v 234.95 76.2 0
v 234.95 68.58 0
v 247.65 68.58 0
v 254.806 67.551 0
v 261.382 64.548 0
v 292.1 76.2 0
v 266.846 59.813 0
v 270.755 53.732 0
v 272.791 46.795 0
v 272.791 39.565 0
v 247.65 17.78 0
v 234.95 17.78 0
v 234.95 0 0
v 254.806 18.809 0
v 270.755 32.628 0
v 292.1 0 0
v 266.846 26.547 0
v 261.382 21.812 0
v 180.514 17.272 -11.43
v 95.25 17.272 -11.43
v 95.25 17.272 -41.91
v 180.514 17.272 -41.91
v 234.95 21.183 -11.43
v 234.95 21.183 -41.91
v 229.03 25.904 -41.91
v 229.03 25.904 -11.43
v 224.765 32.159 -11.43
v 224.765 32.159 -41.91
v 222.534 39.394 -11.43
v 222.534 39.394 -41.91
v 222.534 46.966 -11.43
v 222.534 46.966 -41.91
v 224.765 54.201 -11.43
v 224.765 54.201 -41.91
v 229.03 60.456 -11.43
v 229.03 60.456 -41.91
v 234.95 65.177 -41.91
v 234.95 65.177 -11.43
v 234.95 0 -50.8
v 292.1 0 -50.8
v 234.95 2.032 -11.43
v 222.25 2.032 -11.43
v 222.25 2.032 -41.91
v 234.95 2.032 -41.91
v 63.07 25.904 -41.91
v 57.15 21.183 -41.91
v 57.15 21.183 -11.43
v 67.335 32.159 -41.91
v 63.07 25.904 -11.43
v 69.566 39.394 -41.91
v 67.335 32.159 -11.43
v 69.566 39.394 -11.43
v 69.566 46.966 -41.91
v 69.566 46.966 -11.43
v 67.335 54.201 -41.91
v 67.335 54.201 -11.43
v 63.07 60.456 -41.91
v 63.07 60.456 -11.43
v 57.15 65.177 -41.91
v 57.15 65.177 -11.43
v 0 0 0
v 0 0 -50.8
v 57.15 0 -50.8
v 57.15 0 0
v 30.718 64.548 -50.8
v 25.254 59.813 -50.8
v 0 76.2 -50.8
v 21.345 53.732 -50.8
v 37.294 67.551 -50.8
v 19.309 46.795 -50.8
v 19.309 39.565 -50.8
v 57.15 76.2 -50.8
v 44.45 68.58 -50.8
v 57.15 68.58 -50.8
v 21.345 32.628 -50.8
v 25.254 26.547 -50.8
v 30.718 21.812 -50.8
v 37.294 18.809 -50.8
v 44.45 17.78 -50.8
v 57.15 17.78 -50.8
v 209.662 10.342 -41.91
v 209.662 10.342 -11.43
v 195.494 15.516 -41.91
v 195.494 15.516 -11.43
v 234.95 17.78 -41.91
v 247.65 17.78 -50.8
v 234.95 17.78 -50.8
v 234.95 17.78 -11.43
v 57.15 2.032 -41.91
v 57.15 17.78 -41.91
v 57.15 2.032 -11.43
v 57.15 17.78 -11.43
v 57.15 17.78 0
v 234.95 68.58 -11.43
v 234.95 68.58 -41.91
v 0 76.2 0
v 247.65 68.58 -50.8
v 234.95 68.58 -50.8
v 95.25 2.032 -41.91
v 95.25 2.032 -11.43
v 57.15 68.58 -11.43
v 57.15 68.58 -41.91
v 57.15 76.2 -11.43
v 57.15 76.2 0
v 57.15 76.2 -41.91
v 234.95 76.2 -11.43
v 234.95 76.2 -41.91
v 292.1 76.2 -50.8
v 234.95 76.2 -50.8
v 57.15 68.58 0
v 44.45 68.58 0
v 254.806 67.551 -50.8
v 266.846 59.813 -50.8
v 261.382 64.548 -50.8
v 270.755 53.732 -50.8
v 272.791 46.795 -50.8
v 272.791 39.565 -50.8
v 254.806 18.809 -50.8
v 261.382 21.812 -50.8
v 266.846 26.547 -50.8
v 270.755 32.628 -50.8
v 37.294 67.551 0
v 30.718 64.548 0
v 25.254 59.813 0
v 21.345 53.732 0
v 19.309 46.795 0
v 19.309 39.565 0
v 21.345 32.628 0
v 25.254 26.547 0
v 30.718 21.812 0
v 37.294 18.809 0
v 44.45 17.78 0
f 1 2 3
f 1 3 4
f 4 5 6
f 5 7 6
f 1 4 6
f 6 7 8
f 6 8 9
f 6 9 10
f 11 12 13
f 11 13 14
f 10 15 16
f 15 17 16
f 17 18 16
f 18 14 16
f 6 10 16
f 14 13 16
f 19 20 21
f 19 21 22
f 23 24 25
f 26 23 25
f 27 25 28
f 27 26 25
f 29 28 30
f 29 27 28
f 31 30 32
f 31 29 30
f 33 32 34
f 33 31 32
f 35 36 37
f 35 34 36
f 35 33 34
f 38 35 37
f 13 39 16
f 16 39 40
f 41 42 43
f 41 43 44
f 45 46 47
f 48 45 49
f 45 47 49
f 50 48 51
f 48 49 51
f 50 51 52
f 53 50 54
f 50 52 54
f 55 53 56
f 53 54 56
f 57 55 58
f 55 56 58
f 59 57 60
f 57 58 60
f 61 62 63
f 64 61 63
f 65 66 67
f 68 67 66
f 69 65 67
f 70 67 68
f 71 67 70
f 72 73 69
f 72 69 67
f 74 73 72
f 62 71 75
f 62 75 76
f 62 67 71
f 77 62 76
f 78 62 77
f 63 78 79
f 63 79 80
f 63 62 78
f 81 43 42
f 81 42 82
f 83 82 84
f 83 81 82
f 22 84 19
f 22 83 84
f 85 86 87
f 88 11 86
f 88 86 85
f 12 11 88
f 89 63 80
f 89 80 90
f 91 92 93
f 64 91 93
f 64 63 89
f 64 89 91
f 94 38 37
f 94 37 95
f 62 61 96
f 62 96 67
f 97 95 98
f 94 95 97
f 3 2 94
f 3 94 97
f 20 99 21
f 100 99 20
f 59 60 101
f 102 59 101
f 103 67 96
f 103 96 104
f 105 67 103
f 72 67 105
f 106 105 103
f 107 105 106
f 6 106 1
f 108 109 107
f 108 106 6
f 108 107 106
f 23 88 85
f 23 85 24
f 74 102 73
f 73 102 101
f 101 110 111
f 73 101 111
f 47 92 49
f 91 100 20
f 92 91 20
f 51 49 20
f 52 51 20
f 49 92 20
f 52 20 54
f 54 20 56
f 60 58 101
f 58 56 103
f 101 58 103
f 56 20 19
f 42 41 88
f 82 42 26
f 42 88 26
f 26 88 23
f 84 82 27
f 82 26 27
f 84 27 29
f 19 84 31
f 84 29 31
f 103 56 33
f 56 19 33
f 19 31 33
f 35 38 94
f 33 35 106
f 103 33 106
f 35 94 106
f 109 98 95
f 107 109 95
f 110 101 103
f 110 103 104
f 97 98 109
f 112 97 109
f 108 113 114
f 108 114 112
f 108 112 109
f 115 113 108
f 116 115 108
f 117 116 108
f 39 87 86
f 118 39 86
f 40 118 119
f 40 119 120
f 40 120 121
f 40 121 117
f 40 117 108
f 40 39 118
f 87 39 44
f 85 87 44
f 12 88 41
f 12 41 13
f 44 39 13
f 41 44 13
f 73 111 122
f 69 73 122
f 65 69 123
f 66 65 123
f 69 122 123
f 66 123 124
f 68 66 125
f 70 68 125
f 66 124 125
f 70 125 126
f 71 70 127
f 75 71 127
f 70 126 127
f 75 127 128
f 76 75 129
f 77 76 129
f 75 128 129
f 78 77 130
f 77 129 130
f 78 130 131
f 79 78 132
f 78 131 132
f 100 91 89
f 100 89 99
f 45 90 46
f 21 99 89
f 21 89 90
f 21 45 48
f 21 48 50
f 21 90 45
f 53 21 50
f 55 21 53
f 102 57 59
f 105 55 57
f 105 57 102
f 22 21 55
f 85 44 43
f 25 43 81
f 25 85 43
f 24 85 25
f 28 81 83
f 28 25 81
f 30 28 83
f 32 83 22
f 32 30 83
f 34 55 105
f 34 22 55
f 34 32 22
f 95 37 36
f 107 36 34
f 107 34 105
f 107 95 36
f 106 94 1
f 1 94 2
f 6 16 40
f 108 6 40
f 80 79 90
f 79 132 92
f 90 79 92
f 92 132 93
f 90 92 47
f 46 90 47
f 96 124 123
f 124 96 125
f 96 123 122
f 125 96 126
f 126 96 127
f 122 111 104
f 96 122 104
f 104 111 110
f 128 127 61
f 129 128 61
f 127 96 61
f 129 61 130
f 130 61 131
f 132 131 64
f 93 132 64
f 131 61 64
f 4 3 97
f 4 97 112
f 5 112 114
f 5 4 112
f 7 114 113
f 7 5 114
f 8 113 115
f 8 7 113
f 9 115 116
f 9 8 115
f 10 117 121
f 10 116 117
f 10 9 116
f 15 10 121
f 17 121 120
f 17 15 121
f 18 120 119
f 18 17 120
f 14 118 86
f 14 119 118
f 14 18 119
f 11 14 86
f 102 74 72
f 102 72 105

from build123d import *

# Parameters (mm, degrees)
SKETCH1_W           = 292.1
SKETCH1_H           = 50.8
BOSS_EXTRUDE1_DEPTH = 76.2
SKETCH2_W           = 177.8
SKETCH2_H           = 11.43
SKETCH2_H_2         = 8.89
CUT_EXTRUDE1_DEPTH  = 307.120058147
SKETCH3_W           = 177.8
SKETCH3_H           = 30.48
CUT_EXTRUDE2_DEPTH  = 2.032
SKETCH4_W           = 139.7
SKETCH4_H           = 30.48
CUT_EXTRUDE3_DEPTH  = 15.24
SKETCH5_W           = 12.7
SKETCH5_H           = 30.48
BOSS_EXTRUDE2_DEPTH = 15.24
FILLET1_R           = 64.77
CUT_EXTRUDE4_DEPTH  = 307.120058147
CUT_EXTRUDE5_DEPTH  = 307.120058147


with BuildPart() as part:
    # Sketch1 → Boss-Extrude1 (new body)
    with BuildSketch(Plane(origin=(0, 0, 0), x_dir=(1, 0, 0), z_dir=(0, 1, 0))):
        with Locations((146.05, 25.4)):
            Rectangle(SKETCH1_W, SKETCH1_H)
    extrude(amount=BOSS_EXTRUDE1_DEPTH)

    # Sketch2 → Cut-Extrude1 (cut, through all)
    with BuildSketch(Plane.XZ):
        with Locations((146.05, -5.715)):
            Rectangle(SKETCH2_W, SKETCH2_H)
        with Locations((146.05, -46.355)):
            Rectangle(SKETCH2_W, SKETCH2_H_2)
    extrude(amount=-CUT_EXTRUDE1_DEPTH, mode=Mode.SUBTRACT)

    # Sketch3 → Cut-Extrude2 (cut)
    with BuildSketch(Plane.XZ):
        with Locations((146.05, -26.67)):
            Rectangle(SKETCH3_W, SKETCH3_H)
    extrude(amount=-CUT_EXTRUDE2_DEPTH, mode=Mode.SUBTRACT)

    # Sketch4 → Cut-Extrude3 (cut)
    with BuildSketch(Plane.XZ.offset(-2.032)):
        with Locations((165.1, -26.67)):
            Rectangle(SKETCH4_W, SKETCH4_H)
    extrude(amount=-CUT_EXTRUDE3_DEPTH, mode=Mode.SUBTRACT)

    # Sketch5 → Boss-Extrude2 (add)
    with BuildSketch(Plane.XZ.offset(-17.272)):
        with Locations((228.6, -26.67)):
            Rectangle(SKETCH5_W, SKETCH5_H)
    extrude(amount=BOSS_EXTRUDE2_DEPTH)

    # Fillet1
    # the kernel refuses this fillet: 64.77 mm, written as the material it adds along each edge
    with BuildSketch(Plane(origin=(222.25, 17.272, -41.91), x_dir=(0, -1, 0), z_dir=(0, 0, 1))) as fillet1_piece_1:
        with BuildLine():
            CenterArc((64.77, -41.736458882), FILLET1_R, 139.880833102, 40.119166898)
            Line((0, -41.736458882), (-1.2954, -41.736458882))
            Line((-1.2954, -41.736458882), (-1.2954, 0))
            Line((-1.2954, 0), (0, 1.2954))
            ThreePointArc((0, 1.2954), (7.62, 1.2954), (14.2494, 0.834729178))
            Line((14.2494, 0.834729178), (15.24, 0))
        make_face()
    extrude(amount=30.48)

    # Sketch6 → Cut-Extrude4 (cut, through all)
    with BuildSketch(Plane.XY):
        with BuildLine():
            Line((44.45, 17.78), (57.15, 17.78))
            Line((57.15, 17.78), (57.15, 21.182954744))
            ThreePointArc((57.15, 21.182954744), (69.85, 43.18), (57.15, 65.177045256))
            Line((57.15, 65.177045256), (57.15, 68.58))
            Line((57.15, 68.58), (44.45, 68.58))
            ThreePointArc((44.45, 68.58), (19.05, 43.18), (44.45, 17.78))
        make_face()
    extrude(amount=-CUT_EXTRUDE4_DEPTH, mode=Mode.SUBTRACT)

    # Sketch7 → Cut-Extrude5 (cut, through all)
    with BuildSketch(Plane.XY):
        with BuildLine():
            Line((247.65, 17.78), (234.95, 17.78))
            Line((234.95, 17.78), (234.95, 21.182954744))
            ThreePointArc((234.95, 21.182954744), (222.25, 43.18), (234.95, 65.177045256))
            Line((234.95, 65.177045256), (234.95, 68.58))
            Line((234.95, 68.58), (247.65, 68.58))
            ThreePointArc((247.65, 68.58), (273.05, 43.18), (247.65, 17.78))
        make_face()
    extrude(amount=-CUT_EXTRUDE5_DEPTH, mode=Mode.SUBTRACT)


solid = part.part
